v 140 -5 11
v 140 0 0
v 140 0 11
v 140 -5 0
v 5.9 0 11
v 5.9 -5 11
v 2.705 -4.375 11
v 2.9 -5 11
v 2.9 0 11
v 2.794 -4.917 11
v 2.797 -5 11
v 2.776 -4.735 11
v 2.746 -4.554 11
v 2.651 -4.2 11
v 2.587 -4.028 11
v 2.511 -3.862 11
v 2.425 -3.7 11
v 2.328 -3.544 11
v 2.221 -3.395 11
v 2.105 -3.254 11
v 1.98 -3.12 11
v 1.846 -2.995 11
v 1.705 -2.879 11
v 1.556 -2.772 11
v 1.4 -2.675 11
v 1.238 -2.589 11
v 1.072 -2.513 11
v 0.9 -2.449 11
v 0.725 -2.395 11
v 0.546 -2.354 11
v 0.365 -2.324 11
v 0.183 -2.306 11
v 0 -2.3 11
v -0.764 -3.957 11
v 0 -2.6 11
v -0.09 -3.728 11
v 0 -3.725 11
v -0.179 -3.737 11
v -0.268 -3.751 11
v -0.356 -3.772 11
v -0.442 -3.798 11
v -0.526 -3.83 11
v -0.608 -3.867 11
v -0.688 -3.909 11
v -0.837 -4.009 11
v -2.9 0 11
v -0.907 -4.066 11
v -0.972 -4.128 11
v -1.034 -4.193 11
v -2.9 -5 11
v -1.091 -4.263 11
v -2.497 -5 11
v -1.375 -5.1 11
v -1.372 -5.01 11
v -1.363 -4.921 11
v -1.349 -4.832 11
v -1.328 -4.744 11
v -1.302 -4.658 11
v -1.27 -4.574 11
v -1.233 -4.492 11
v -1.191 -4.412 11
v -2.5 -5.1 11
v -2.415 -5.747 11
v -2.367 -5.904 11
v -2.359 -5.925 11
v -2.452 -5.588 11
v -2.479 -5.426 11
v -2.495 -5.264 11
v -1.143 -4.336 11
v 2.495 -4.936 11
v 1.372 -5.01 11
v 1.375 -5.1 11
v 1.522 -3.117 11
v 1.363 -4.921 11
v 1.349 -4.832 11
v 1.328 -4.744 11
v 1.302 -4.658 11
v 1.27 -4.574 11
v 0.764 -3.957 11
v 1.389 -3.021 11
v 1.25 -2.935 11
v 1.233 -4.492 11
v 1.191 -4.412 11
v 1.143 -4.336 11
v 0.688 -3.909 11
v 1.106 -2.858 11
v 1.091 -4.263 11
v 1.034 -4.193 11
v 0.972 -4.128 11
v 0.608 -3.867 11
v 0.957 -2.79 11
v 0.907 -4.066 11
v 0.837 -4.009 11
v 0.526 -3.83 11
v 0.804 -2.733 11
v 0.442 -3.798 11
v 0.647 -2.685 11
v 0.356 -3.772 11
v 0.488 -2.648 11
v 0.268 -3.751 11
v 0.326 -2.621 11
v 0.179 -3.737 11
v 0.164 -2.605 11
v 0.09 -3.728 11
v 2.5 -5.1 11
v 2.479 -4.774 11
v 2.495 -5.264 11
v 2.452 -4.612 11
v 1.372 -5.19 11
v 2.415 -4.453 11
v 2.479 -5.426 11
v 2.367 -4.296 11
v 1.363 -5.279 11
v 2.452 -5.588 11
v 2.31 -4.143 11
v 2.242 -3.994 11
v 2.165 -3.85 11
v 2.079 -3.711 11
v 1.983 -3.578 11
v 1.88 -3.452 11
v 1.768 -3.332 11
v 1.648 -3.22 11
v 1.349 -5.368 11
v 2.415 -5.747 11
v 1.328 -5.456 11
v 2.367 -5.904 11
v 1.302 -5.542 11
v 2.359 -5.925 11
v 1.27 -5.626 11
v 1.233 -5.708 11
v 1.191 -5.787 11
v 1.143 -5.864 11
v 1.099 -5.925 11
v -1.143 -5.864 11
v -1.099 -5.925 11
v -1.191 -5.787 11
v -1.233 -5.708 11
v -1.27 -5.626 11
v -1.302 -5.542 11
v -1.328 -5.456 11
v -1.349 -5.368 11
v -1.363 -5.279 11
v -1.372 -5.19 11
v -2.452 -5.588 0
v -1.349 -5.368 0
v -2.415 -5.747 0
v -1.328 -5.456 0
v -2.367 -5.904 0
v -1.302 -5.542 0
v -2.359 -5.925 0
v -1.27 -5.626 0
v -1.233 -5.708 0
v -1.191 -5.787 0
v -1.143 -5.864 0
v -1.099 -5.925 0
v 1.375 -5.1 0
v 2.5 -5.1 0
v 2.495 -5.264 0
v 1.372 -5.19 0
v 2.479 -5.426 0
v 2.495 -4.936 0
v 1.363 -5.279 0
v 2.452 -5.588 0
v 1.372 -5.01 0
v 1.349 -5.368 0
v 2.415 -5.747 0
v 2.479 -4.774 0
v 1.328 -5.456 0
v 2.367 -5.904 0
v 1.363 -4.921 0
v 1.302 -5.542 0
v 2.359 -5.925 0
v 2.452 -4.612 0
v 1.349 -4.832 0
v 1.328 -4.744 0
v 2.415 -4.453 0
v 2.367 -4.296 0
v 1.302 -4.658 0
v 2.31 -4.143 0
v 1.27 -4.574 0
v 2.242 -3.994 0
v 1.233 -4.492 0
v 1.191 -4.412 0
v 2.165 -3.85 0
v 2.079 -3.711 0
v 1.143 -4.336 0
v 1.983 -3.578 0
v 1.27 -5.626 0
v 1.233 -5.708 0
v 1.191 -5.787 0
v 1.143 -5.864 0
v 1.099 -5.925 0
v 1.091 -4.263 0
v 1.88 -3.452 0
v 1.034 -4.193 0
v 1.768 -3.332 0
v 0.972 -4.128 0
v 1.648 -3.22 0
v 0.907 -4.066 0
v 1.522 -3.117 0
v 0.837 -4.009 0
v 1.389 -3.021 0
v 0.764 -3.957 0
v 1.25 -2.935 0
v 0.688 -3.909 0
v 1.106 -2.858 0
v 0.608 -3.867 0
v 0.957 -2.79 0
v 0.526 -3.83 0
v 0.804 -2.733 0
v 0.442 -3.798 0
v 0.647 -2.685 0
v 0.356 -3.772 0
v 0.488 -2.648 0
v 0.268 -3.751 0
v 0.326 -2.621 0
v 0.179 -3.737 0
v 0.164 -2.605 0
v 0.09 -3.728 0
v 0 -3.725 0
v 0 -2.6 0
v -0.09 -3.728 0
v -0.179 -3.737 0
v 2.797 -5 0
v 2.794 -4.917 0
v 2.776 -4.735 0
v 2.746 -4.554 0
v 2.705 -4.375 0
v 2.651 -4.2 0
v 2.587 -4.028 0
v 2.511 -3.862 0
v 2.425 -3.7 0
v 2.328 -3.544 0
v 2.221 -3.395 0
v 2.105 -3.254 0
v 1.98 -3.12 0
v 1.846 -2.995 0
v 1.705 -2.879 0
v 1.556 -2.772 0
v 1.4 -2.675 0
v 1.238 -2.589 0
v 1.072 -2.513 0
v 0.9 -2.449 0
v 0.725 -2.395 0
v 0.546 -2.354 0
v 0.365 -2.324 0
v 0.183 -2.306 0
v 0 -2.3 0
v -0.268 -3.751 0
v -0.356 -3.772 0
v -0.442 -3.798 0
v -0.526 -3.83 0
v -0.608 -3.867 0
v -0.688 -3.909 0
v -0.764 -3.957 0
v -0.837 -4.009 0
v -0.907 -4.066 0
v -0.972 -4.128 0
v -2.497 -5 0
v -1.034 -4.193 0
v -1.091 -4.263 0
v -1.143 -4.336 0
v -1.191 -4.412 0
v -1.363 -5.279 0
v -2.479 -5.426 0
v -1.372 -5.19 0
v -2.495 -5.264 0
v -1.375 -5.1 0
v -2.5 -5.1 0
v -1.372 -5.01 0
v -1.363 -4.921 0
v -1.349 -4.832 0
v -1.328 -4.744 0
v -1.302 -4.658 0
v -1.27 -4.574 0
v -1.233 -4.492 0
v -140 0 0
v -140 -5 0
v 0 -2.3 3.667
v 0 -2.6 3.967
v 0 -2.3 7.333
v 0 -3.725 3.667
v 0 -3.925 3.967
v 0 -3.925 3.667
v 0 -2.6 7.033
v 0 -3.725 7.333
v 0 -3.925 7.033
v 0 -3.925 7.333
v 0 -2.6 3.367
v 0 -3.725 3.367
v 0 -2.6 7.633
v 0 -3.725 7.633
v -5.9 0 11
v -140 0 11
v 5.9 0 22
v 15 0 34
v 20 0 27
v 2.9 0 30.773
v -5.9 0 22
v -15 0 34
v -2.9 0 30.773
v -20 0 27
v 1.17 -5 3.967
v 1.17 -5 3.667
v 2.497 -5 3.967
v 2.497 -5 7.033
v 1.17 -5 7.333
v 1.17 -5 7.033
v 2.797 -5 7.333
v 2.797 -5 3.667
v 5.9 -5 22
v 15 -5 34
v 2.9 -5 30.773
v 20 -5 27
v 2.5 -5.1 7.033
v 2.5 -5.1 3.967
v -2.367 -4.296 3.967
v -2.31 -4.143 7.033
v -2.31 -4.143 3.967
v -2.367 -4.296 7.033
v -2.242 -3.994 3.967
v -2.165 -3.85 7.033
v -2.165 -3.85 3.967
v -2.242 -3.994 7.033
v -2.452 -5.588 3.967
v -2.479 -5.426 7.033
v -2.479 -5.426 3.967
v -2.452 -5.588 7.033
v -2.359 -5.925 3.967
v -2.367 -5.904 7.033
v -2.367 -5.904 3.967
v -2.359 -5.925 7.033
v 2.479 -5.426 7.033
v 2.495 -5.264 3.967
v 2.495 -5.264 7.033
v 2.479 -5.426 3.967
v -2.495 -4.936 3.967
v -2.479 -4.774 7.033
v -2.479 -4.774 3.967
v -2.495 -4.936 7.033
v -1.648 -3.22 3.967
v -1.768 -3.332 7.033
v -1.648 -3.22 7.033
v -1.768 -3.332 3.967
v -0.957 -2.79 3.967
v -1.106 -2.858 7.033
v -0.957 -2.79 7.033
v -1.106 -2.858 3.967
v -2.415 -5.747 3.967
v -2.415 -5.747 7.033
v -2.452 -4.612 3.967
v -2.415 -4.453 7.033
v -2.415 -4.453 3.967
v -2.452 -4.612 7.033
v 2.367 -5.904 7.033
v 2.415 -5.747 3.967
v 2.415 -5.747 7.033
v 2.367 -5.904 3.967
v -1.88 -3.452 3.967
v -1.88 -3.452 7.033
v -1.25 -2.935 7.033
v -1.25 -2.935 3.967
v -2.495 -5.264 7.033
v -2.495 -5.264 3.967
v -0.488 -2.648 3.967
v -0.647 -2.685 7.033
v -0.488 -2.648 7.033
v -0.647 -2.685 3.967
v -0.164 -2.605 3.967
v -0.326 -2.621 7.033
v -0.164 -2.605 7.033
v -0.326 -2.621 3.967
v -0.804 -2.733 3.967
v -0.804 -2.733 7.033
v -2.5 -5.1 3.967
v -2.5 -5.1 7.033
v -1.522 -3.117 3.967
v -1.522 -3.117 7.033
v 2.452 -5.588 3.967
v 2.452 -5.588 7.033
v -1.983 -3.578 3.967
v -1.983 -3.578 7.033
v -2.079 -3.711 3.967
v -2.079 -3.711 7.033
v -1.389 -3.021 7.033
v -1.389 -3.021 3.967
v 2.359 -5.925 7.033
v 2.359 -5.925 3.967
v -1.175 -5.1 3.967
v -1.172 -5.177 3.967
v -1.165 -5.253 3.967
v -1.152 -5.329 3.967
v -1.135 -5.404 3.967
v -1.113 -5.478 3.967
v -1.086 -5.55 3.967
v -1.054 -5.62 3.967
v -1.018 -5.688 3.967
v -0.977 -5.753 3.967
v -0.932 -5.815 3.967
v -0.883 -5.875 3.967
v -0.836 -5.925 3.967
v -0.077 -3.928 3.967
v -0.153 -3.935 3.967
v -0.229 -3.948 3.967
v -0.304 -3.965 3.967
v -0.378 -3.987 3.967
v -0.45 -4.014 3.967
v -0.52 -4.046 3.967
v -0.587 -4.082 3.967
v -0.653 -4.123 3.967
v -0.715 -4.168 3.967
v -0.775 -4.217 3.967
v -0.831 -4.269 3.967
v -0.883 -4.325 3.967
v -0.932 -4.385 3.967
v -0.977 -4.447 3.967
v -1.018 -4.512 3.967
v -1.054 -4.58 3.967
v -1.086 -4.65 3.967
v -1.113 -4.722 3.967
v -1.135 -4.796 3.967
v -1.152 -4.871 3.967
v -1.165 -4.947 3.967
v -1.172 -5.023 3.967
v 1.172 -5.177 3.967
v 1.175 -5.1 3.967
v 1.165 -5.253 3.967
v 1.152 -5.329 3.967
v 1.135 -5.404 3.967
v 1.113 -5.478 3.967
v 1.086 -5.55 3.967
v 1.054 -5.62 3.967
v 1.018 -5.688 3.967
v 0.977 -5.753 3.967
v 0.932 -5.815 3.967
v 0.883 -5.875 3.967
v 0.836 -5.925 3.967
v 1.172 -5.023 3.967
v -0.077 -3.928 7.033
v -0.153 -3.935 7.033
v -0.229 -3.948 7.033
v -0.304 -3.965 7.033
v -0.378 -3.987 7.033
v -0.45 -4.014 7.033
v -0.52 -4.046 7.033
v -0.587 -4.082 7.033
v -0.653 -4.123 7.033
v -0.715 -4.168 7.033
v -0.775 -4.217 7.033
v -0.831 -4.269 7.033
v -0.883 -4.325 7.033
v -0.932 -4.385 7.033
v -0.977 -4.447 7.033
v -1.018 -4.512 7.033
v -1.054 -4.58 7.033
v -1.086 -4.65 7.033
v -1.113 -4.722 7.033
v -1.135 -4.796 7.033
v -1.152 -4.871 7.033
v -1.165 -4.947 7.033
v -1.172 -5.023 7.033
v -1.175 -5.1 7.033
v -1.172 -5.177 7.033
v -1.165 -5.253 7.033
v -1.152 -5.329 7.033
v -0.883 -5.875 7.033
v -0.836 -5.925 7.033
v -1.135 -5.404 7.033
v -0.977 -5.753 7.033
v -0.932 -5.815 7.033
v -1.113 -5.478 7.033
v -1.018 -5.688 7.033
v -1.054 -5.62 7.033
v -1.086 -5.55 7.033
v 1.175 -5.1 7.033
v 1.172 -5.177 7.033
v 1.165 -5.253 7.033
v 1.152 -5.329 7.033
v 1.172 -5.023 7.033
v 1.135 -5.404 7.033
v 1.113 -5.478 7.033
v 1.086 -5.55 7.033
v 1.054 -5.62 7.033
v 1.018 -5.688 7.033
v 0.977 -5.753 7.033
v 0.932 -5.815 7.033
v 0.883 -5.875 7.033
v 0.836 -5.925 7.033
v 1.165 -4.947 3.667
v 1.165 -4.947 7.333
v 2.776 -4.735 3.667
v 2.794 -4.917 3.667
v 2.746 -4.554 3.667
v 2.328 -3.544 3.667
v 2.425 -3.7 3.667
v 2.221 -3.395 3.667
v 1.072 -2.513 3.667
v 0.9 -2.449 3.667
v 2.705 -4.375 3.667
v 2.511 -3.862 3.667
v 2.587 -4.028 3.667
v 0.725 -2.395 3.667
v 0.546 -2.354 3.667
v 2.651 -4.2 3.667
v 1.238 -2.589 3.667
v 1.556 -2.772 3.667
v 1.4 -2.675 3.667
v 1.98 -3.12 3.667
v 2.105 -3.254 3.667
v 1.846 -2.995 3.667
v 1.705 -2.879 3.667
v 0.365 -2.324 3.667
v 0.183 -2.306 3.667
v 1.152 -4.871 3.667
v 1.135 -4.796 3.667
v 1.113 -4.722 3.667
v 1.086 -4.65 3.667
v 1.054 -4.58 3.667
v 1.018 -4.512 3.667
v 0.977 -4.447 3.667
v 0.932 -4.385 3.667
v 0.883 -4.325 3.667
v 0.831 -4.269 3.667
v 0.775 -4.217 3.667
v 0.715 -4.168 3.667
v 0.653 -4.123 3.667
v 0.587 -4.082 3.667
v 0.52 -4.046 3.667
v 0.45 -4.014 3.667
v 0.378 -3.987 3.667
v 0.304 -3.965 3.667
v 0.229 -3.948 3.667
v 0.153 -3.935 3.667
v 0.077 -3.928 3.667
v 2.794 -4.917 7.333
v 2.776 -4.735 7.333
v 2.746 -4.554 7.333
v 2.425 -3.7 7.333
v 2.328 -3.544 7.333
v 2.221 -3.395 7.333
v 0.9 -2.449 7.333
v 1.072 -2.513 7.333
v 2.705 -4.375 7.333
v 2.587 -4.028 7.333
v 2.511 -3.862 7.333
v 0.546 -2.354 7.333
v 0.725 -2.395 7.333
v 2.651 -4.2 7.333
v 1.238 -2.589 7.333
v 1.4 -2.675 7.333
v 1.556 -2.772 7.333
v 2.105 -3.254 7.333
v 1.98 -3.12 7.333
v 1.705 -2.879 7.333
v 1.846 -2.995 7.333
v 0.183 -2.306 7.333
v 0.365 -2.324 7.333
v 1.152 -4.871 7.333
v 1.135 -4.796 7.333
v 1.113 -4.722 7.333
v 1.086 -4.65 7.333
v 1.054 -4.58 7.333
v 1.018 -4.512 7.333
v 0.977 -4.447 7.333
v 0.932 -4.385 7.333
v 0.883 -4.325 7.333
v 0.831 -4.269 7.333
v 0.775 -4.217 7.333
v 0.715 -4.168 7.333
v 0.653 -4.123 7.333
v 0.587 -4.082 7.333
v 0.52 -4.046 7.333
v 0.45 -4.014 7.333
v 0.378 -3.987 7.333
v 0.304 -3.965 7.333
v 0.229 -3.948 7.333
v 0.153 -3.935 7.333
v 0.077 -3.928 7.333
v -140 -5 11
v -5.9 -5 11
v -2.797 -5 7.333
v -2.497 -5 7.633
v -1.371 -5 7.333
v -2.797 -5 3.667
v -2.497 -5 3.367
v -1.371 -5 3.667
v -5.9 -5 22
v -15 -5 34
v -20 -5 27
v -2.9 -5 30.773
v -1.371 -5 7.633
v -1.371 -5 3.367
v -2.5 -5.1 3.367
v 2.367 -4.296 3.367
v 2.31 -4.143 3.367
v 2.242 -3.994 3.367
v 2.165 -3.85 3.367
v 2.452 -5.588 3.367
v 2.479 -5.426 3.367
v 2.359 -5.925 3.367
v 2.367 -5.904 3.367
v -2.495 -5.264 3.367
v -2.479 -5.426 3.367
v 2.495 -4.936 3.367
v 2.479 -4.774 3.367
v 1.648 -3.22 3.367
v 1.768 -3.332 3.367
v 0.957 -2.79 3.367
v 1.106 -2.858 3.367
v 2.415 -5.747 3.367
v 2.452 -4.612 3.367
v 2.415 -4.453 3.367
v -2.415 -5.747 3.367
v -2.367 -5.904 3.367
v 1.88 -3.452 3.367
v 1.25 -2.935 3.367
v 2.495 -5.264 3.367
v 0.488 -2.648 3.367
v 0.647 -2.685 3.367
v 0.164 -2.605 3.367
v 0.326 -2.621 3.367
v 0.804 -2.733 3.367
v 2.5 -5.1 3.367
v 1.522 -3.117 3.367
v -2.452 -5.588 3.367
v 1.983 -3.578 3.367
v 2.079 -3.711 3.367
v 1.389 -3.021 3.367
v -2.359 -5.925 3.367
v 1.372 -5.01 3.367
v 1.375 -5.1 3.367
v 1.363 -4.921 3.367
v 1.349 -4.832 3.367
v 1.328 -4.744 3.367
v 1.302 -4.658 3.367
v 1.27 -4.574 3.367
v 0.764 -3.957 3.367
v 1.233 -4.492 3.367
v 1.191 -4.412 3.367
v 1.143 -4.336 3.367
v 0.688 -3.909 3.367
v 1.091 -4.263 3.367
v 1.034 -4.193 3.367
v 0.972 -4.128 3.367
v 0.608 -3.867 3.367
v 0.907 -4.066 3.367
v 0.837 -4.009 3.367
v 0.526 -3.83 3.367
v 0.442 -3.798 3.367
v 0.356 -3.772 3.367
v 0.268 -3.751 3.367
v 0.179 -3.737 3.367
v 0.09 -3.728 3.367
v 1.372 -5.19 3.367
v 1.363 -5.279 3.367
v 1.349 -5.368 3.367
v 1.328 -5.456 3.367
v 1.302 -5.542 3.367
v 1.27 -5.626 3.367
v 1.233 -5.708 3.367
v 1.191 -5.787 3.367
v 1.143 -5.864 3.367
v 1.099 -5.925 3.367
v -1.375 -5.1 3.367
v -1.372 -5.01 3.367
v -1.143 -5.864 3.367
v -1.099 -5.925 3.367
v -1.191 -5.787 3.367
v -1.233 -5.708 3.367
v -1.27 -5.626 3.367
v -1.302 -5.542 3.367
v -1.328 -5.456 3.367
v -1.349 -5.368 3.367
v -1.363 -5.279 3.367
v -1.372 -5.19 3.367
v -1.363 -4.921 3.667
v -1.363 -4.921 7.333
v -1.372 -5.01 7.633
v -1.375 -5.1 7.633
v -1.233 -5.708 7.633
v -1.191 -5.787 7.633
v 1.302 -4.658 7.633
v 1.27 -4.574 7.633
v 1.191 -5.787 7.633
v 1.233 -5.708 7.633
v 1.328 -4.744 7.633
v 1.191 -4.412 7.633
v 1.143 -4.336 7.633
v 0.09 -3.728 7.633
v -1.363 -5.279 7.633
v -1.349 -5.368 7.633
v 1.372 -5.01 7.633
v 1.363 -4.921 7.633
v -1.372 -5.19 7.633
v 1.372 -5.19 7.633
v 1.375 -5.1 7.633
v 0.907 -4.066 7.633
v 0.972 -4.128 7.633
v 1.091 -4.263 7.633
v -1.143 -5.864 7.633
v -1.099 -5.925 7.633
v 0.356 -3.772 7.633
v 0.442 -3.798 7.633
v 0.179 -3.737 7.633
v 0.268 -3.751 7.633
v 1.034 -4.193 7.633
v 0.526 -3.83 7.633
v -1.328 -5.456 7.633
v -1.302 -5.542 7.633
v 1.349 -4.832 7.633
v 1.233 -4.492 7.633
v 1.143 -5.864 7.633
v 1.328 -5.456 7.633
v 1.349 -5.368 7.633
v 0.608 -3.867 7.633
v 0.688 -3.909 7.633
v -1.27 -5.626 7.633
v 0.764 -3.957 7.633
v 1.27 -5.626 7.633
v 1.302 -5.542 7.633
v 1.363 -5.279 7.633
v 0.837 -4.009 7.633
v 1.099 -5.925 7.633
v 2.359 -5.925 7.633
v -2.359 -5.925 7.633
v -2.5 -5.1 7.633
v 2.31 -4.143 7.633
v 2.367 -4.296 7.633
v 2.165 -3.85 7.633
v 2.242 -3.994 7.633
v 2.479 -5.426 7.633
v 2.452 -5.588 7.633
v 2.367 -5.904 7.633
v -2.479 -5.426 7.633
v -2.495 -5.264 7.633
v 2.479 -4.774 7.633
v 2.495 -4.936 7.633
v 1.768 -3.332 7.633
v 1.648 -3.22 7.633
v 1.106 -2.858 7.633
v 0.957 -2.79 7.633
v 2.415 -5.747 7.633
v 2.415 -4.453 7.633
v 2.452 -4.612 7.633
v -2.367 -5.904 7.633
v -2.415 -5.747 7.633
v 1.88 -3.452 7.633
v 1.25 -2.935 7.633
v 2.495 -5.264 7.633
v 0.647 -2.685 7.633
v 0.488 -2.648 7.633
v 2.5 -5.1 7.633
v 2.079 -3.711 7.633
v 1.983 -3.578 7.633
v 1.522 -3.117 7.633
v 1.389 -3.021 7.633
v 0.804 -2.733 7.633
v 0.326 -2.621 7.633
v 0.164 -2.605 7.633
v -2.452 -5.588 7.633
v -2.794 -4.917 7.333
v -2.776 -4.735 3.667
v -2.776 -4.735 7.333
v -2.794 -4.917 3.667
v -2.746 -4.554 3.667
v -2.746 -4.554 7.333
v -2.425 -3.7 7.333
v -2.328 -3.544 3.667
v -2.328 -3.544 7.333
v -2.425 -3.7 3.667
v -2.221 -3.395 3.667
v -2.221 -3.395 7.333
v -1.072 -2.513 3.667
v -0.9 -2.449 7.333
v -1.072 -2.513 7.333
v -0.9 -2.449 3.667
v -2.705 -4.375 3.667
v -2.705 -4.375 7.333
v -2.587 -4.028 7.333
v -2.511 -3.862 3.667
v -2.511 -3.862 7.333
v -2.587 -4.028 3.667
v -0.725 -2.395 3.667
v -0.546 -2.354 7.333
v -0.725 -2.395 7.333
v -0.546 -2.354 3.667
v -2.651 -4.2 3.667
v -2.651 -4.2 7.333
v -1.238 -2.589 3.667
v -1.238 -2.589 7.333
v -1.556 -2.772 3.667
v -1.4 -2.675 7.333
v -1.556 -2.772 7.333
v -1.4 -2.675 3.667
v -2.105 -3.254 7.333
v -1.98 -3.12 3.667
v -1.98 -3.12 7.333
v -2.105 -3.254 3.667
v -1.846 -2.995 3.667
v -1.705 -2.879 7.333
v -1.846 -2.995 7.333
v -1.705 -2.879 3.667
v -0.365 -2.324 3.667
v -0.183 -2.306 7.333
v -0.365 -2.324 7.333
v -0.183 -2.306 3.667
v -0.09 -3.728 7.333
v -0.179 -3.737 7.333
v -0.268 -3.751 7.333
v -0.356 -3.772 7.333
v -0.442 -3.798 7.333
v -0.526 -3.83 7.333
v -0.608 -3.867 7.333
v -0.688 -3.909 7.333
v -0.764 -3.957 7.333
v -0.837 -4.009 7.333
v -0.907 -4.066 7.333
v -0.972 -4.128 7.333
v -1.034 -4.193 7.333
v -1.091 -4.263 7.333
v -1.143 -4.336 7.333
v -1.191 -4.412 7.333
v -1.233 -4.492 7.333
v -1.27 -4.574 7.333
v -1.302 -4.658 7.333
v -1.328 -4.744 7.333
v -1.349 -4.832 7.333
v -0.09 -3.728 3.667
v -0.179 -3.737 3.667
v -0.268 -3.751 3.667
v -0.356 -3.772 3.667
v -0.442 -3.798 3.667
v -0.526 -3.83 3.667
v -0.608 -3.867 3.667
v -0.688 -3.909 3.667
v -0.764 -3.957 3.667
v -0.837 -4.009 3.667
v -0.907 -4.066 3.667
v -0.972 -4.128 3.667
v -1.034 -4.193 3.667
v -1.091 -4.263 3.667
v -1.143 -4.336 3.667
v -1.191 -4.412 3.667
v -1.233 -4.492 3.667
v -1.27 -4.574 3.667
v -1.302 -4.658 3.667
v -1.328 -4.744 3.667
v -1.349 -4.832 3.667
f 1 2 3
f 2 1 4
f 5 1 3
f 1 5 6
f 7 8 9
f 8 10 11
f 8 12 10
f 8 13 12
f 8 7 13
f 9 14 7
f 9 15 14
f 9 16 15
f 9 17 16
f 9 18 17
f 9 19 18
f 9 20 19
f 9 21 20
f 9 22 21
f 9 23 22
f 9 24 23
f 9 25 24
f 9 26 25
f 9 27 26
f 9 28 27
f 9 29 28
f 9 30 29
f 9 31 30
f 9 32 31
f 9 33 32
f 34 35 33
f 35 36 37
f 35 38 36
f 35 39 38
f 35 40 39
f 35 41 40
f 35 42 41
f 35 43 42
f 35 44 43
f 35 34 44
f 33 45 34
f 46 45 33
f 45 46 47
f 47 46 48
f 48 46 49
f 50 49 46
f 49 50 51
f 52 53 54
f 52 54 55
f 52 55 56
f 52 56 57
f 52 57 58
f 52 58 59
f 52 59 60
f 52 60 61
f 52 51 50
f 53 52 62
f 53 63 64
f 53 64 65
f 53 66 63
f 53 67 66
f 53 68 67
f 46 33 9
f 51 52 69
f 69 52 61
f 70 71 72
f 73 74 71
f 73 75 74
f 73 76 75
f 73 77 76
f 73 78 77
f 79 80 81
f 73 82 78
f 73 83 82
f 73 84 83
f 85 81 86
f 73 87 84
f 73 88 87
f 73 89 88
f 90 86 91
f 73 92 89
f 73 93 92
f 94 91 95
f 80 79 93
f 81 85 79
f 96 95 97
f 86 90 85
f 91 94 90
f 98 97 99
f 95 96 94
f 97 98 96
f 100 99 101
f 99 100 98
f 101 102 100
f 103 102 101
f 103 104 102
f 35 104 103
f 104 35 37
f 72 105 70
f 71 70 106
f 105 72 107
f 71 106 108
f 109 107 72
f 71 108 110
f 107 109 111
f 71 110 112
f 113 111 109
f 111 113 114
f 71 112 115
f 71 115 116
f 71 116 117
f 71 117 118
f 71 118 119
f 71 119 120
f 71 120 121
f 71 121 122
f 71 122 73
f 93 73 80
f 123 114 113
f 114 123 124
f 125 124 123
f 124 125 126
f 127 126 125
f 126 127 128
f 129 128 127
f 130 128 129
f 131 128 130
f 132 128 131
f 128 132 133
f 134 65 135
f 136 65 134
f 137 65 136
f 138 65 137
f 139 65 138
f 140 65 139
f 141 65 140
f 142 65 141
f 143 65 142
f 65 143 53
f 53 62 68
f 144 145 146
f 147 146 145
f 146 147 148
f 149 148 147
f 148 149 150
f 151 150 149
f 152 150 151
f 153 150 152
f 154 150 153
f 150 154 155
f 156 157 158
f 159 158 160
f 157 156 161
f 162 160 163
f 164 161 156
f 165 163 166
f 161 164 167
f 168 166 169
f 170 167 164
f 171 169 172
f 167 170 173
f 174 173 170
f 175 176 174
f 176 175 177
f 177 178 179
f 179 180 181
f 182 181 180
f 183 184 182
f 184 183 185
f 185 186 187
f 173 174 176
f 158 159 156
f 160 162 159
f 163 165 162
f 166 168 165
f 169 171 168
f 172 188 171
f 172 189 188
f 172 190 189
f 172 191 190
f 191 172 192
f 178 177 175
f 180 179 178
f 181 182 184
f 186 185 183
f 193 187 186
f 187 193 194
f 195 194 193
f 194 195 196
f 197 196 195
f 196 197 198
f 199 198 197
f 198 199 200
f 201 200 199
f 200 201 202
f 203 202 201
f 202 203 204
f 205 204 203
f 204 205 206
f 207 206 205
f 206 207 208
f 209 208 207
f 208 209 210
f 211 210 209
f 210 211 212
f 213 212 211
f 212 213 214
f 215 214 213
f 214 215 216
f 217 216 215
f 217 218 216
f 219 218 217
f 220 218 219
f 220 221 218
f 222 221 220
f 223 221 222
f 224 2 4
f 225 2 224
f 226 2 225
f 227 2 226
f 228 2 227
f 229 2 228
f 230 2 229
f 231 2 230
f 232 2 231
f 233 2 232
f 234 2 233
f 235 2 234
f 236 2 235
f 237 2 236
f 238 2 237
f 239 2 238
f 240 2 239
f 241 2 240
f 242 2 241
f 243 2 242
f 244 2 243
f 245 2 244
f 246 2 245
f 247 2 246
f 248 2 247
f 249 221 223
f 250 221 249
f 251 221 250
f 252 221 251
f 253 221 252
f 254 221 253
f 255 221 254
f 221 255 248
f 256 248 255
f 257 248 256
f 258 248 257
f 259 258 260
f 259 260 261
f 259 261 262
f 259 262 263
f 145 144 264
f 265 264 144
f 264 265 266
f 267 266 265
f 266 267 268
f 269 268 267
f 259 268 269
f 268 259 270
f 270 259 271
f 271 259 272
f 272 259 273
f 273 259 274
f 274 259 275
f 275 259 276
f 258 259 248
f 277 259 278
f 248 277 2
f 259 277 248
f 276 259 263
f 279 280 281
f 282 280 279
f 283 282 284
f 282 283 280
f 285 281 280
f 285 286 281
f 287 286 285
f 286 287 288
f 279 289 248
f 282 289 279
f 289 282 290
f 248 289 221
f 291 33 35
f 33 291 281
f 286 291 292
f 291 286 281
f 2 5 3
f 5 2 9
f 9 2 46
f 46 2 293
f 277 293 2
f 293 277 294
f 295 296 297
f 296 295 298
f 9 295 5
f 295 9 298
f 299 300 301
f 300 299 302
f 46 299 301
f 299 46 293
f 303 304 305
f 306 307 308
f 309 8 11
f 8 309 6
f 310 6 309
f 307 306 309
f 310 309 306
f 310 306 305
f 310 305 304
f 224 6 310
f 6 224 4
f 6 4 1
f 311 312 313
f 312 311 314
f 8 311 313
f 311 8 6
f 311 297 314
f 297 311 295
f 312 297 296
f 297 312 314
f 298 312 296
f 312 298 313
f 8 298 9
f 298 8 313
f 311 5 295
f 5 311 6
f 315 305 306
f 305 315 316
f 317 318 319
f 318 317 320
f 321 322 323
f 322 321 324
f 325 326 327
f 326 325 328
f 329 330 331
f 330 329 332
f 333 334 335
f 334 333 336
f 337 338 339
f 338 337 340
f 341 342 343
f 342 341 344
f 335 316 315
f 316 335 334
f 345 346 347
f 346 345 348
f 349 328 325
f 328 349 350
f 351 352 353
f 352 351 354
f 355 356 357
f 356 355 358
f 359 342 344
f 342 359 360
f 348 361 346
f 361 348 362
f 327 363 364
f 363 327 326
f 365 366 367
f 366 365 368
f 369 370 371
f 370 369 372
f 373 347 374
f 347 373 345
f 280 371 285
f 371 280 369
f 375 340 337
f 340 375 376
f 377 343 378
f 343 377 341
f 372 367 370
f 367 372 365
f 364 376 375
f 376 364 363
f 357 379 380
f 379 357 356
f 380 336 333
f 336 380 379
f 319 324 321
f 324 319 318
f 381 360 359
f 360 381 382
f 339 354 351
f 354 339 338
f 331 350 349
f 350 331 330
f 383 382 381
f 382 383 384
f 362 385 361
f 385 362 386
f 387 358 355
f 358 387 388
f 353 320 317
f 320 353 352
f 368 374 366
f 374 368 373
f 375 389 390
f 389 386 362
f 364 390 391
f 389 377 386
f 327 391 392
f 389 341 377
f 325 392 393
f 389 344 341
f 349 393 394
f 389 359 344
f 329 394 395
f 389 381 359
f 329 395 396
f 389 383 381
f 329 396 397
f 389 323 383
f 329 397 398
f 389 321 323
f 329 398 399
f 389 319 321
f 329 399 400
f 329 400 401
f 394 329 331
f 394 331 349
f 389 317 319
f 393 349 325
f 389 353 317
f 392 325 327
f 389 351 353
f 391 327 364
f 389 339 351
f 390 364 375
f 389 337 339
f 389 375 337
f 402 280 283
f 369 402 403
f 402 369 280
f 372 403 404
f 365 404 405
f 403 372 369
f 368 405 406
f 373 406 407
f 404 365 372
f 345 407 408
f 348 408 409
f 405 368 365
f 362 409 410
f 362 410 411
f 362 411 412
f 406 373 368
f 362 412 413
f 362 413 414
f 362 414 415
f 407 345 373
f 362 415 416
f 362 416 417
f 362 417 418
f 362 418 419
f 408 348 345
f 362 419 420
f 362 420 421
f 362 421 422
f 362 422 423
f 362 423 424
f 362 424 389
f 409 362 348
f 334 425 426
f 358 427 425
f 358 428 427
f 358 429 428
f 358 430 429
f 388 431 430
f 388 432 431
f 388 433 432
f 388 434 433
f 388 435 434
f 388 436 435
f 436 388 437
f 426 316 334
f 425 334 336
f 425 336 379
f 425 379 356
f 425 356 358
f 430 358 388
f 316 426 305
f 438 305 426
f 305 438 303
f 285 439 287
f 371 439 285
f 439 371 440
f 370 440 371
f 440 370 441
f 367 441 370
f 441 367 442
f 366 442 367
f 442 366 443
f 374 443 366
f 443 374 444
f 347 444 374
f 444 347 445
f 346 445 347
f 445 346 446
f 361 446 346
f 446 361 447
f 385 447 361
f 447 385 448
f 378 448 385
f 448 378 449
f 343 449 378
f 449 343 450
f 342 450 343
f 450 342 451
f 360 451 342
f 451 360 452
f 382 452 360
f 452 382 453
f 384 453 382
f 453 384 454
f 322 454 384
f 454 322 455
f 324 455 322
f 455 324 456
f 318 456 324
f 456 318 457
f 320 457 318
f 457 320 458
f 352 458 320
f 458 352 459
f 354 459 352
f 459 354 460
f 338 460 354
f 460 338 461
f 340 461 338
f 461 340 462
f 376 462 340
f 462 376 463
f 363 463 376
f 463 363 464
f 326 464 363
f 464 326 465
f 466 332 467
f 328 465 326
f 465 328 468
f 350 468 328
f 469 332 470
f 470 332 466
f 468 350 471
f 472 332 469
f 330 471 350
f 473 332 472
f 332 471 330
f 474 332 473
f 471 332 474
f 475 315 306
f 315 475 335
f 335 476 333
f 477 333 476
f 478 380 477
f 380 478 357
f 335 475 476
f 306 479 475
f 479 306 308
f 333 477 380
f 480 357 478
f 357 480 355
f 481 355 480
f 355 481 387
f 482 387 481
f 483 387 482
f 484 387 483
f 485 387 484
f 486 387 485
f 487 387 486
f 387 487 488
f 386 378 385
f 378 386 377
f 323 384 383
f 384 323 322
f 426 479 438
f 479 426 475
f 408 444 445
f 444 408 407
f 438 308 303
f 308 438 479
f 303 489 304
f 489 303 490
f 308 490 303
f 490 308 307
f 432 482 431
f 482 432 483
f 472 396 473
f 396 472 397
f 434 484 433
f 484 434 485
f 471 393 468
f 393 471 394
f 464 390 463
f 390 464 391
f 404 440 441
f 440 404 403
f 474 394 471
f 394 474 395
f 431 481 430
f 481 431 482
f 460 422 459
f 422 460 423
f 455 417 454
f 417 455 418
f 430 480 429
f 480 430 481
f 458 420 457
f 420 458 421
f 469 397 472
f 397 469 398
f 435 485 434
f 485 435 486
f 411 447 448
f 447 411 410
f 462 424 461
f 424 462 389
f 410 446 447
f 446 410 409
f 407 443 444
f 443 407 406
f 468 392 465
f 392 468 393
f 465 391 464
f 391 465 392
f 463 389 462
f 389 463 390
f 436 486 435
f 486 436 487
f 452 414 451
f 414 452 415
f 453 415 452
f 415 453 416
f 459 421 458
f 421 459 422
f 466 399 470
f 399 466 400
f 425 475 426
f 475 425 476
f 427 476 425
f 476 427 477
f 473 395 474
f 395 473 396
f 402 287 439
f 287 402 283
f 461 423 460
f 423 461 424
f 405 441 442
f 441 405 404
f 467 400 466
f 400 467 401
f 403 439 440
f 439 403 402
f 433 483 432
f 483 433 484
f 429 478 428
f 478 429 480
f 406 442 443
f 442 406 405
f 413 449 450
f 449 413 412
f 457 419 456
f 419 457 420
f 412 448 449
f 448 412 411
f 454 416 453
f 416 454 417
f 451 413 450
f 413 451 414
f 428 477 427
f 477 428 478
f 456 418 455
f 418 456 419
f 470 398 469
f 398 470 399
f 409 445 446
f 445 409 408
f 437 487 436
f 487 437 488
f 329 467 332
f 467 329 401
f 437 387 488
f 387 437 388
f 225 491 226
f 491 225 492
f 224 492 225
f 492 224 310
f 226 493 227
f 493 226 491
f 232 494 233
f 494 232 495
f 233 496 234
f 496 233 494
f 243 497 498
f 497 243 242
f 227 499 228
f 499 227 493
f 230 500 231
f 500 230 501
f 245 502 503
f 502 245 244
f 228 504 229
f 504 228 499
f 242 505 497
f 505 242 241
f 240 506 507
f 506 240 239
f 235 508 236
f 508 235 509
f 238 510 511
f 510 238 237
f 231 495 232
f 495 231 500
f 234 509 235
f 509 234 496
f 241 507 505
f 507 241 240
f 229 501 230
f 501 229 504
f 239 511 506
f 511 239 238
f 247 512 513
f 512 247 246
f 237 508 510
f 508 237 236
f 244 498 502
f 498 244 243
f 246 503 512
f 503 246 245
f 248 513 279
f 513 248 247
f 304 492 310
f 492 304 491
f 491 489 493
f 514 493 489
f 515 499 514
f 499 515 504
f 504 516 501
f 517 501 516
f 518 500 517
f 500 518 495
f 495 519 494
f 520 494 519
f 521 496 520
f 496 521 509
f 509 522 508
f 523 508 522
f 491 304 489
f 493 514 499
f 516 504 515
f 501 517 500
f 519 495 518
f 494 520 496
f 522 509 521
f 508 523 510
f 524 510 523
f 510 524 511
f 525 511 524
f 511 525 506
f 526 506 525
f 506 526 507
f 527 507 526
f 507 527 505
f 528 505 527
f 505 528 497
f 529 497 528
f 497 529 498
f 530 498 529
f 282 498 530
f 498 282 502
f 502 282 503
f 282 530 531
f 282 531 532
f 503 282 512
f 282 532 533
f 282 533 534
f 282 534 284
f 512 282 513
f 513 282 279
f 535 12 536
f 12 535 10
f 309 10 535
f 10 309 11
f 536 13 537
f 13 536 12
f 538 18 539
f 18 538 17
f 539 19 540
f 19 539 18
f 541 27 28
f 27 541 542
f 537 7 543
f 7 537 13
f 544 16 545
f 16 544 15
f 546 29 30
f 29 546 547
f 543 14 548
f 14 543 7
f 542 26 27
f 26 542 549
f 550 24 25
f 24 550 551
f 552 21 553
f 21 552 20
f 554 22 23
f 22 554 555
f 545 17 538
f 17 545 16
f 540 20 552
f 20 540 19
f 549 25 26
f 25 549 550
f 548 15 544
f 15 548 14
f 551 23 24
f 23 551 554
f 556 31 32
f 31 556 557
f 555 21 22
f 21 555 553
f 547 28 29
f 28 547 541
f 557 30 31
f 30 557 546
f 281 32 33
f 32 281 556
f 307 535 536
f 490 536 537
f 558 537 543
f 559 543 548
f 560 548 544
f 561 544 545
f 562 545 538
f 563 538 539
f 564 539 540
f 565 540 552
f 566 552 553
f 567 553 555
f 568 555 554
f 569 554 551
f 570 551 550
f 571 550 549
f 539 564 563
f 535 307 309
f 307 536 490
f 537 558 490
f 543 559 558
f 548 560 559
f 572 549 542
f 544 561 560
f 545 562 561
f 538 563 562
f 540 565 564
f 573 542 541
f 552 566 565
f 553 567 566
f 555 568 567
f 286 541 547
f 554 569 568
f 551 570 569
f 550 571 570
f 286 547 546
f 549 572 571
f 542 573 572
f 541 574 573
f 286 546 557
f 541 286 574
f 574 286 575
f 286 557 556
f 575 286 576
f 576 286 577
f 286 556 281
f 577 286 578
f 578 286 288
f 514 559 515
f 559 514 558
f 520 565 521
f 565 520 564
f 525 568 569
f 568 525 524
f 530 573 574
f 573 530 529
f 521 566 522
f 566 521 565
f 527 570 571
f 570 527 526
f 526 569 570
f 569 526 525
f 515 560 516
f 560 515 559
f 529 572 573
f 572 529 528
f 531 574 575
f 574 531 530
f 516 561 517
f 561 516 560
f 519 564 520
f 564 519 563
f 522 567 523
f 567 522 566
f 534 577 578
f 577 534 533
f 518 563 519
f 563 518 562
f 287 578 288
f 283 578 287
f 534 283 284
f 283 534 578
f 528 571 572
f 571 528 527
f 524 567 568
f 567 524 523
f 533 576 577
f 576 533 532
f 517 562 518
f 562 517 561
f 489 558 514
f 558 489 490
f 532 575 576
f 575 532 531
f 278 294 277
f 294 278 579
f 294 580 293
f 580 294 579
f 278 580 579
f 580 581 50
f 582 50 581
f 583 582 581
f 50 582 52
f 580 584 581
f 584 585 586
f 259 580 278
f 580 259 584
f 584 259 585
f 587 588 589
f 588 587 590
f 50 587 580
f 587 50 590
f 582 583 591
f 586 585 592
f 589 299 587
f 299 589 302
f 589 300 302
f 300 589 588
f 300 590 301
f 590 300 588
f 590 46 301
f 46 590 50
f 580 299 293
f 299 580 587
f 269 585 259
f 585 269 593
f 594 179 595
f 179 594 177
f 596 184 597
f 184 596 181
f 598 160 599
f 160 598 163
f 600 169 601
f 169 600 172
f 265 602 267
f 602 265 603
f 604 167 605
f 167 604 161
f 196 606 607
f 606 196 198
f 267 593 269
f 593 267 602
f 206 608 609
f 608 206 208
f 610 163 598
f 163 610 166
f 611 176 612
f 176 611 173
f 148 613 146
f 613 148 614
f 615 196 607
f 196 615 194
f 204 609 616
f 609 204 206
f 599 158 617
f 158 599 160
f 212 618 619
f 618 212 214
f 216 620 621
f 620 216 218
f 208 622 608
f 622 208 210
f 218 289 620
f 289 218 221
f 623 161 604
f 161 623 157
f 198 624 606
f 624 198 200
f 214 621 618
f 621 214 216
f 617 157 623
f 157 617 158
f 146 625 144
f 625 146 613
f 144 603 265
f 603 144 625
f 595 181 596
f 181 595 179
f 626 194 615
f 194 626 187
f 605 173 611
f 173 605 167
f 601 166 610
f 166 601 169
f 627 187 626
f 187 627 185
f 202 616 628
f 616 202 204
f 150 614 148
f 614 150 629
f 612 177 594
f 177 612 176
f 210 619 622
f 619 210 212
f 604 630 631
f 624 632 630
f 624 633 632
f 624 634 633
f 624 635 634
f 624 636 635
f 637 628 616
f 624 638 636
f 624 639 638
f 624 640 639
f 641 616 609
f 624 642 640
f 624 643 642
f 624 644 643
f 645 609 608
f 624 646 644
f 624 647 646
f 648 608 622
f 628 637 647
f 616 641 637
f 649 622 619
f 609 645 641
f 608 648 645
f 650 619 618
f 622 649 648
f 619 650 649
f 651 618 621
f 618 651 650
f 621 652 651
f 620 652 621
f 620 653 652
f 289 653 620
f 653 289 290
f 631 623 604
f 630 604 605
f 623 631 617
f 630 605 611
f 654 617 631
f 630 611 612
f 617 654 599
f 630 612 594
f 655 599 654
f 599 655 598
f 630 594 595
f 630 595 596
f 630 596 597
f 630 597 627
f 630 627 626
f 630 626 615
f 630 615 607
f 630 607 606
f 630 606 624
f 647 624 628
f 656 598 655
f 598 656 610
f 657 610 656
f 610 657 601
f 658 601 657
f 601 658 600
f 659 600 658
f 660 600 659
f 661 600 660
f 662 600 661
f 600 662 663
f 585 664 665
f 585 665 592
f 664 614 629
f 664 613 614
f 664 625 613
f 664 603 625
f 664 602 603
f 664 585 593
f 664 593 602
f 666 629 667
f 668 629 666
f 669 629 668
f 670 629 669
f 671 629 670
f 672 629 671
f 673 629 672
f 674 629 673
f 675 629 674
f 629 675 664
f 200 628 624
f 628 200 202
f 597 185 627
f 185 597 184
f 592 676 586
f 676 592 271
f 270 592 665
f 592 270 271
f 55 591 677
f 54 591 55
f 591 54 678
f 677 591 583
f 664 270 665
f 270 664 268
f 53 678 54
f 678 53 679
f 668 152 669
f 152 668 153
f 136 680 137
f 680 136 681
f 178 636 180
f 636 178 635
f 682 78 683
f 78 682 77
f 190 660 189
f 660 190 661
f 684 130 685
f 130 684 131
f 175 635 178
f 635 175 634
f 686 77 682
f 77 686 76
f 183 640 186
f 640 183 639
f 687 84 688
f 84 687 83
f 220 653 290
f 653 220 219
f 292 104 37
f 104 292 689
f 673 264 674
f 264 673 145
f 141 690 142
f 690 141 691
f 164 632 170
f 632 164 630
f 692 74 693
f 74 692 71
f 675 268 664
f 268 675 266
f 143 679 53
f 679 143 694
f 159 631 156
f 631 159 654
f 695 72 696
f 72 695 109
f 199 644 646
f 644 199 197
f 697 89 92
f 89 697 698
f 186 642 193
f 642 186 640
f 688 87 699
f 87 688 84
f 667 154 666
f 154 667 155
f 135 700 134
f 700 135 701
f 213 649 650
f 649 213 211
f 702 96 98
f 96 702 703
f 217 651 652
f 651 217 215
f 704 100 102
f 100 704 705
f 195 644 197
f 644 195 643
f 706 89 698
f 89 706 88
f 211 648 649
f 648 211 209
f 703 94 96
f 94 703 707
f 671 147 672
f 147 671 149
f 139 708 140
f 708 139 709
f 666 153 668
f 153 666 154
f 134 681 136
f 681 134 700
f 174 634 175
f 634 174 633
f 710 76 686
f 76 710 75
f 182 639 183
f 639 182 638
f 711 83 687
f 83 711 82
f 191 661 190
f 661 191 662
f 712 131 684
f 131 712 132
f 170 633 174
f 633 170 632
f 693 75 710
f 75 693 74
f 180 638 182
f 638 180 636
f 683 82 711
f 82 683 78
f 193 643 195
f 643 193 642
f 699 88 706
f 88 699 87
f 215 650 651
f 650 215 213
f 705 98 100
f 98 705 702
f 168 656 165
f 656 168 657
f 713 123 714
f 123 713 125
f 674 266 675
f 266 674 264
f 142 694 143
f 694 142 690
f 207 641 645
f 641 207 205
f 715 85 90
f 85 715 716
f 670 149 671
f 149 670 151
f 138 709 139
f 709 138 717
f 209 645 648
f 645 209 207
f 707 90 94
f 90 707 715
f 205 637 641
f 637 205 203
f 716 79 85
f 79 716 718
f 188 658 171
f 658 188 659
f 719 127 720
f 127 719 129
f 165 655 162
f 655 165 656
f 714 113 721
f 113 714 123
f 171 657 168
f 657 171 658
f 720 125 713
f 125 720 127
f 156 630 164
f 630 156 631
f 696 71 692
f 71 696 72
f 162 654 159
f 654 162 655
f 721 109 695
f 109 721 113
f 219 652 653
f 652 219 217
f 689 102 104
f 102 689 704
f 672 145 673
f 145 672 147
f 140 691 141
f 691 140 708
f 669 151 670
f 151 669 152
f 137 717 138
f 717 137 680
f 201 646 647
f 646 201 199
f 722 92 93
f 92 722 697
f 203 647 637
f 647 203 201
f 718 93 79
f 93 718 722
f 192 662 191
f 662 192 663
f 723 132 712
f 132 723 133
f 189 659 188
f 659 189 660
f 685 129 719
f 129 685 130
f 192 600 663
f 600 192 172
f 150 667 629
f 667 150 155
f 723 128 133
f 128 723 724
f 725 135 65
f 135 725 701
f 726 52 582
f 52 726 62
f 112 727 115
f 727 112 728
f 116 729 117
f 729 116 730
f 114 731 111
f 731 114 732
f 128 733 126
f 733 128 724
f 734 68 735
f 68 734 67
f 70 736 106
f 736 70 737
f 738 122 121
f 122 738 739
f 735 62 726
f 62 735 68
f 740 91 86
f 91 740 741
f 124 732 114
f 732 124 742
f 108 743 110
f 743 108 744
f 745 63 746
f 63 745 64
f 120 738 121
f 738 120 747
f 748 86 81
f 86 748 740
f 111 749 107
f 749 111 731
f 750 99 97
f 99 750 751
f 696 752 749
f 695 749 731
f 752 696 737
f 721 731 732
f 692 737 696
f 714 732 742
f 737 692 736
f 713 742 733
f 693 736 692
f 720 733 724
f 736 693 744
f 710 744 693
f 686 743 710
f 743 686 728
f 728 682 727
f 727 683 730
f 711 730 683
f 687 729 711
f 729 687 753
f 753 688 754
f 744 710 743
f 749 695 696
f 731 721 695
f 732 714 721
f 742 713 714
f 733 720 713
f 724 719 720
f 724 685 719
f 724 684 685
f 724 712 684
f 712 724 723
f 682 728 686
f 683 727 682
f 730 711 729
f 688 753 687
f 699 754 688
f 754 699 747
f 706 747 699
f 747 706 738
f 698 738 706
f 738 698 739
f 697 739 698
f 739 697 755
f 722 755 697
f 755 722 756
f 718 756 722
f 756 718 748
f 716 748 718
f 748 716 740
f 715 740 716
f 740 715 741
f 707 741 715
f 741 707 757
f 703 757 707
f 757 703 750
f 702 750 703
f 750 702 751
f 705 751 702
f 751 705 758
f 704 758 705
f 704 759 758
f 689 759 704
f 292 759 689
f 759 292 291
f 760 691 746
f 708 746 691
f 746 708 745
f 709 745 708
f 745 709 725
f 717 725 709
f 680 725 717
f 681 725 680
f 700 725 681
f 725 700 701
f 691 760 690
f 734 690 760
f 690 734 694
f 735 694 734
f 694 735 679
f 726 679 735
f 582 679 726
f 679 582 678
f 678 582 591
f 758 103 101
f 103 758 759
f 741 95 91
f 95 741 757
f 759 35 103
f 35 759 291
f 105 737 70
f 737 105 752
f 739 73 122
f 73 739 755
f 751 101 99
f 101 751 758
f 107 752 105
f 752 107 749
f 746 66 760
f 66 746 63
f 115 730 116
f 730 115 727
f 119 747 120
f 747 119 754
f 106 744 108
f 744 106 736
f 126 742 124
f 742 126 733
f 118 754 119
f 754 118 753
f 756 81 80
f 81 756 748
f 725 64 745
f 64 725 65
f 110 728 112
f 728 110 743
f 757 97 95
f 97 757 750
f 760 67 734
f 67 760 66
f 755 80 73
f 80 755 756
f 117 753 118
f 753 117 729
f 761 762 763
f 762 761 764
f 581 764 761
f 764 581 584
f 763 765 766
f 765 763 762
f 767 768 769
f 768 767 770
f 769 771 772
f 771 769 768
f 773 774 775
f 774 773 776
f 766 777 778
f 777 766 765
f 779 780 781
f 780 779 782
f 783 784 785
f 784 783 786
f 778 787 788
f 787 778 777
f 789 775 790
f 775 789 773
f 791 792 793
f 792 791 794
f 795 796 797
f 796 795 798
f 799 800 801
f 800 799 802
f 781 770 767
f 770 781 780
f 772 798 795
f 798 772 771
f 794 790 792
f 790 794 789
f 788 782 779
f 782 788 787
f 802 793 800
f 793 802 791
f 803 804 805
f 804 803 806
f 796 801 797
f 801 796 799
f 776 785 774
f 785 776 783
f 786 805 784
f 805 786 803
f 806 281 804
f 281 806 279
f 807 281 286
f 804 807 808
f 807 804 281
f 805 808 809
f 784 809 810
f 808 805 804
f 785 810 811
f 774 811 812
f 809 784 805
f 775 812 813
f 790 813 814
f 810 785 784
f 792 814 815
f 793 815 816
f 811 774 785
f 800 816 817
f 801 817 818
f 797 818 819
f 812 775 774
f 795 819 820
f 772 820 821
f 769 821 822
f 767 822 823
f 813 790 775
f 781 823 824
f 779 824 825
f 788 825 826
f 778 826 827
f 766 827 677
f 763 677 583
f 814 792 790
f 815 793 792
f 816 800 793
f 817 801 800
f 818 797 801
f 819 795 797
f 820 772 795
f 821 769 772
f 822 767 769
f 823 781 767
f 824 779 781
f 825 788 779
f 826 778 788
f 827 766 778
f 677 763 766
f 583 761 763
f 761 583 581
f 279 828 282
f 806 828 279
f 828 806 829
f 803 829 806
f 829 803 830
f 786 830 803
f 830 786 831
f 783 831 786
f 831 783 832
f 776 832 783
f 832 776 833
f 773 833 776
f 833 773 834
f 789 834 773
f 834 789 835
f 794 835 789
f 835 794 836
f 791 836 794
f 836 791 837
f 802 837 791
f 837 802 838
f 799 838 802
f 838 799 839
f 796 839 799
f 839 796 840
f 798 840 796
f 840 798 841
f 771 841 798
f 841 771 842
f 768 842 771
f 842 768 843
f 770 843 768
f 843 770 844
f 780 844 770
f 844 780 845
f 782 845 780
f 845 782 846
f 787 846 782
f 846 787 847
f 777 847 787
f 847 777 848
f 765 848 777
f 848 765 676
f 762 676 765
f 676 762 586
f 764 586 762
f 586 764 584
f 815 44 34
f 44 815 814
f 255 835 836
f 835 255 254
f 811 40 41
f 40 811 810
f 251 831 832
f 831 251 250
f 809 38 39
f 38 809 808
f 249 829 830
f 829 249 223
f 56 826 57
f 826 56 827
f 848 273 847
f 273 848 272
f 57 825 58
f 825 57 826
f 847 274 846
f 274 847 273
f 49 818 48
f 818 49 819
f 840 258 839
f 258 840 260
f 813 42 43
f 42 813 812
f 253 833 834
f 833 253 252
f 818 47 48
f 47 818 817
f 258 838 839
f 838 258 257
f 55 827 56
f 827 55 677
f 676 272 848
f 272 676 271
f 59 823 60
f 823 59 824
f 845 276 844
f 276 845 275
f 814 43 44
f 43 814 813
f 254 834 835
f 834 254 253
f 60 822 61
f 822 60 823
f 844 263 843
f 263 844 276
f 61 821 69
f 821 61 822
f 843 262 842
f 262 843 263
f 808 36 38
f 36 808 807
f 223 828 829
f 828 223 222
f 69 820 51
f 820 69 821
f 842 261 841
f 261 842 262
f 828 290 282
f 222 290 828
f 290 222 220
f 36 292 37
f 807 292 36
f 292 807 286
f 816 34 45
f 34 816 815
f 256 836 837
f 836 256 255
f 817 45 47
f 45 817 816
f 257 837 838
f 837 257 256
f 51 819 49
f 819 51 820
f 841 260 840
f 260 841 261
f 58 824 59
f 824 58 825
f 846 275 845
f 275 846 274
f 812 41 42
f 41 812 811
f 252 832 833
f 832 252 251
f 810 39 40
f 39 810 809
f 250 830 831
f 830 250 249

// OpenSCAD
// =====================================================================
//  STRUCTURE DE CABAS VELO -- type BikeZac / Cobags            [v14]
//
//  LE CROCHET SE POSE, IL NE SE CLIPSE PAS.
//    Le tube du porte-bagages est ferme, soude au cadre : on ne l'enfile
//    pas dans une bouche etroite, on POSE le crochet dessus. Le v12
//    enroulait 230 deg avec une bouche de 8 mm -- impossible a engager.
//    Ce n'etait pas une cote fausse, c'etait la cinematique de montage.
//
//  FORME EN R (v14, d'apres le croquis cote).
//    Un dos plat (le collier qui enfile le jonc), un BRAS DU HAUT
//    horizontal, un VENTRE en arc qui epouse le tube, puis une LANGUETTE
//    droite qui descend : le pied du R, levier de decrochage. Le tube se
//    loge dans le ventre.
//    Le centre de l'arc EST le centre du tube : si le rayon interieur
//    vaut tube_d/2 + clr, l'arc epouse le flanc et le bras du haut touche
//    le sommet. Une seule cote (tube_d) gouverne les deux.
//
//  CE QUI TIENT LE SAC : le poids, qui plaque le bras du haut sur le tube,
//    et l'elastique en bas. Pas une barbe serree. La languette ne
//    "declipse" rien, elle fait pivoter le crochet a la main.
//
//  IMPRESSION : profil plan, extrude 15,05 mm en Z. Aucun porte-a-faux.
//    Dans un ruban qui flechit, la contrainte court LE LONG du ruban,
//    donc dans le plan des couches.
//
//  NB. Les cotes du croquis (dos 25, bras 15/10, ventre 21x17, languette
//  10) sont dans docs/target_hook.json. On ne les recopie pas ici : le
//  modele sort ses cotes REELLES par echo, l'outillage superpose la cible.
// =====================================================================

$fn = 96;
part = "all";   // "a"|"b"|"hook"|"hooks3"|"gauge"|"plate"|"hinge_test"|"all"

// --- JONC -------------------------------------------------------------
total_len   = 280;
bar_h       = 11;
bar_t       = 5;
hook_start  = 37.5;
tail_span   = 40;
tail_stem   = 14;

// --- COTES RELEVEES SUR LE CROCHET ORIGINAL ---------------------------
hook_len    = 15.05;  // largeur : axe d'extrusion
hook_depth  = 21.55;  // face du collier -> point le plus eloigne (croquis : 21)

// --- MESURE -----------------------------------------------------------
tube_d      = 12.23;  // tube du porte-bagages, au pied a coulisse
rib_t       = 2.5;    // epaisseur du ruban   (A CONFIRMER)
clr         = 0.4;    // jeu ruban / tube

// --- FORME DU R, ESTIME SUR PHOTO/CROQUIS, A CORRIGER -----------------
wrap_end    = -50;    //   0  = quart de cercle nu, rien ne retient
                      // -50  = le ruban passe sous le tube : levre legere
                      // plus negatif = levre plus fermee, pose plus dure
lang_l      = 10;     // longueur de la languette (le pied du R). Croquis : 10
lang_ang    = -90;    // cap absolu de la languette : -90 = tout droit vers le
                      // bas. Plus positif = languette rejetee vers le tube
                      // (referme la bouche) ; plus negatif = vers le dos.
bevel_a     = 35;     // biseau du bout de languette

// --- COLLIER ----------------------------------------------------------
col_wall    = 1.8;
col_clr     = 0.15;

// --- CHARNIERE --------------------------------------------------------
pin_d       = 2.5;    // 2.5 corde a piano | 4.0 vis sans tete M4
pin_gap     = 0.1;
kn_wall     = 1.25;
capture_t   = 0.3;
kn_clr      = 0.3;
hinge_clr   = 0.3;
tight_int   = 0.15;
free_clr    = 0.25;

// =====================  GEOMETRIE DERIVEE  ============================
half_len   = total_len / 2;
pin_y      = -(bar_t + pin_gap);
knuckle    = pin_d/2 + kn_wall;
bore_tight = pin_d - tight_int;
bore_free  = pin_d + free_clr;
rc         = knuckle + hinge_clr;
butee      = abs(pin_y) - rc;
tail_root  = rc + 0.1;
hinge_lip  = sqrt(pow(bore_free/2,2) - pow((pin_d - capture_t)/2,2));
debord     = pin_gap + hinge_lip;
axe_out    = pin_gap + pin_d/2;
capture    = pin_d - 2*sqrt(pow(bore_free/2,2) - pow(hinge_lip,2));
k1 = bar_h/3;
k2 = 2*bar_h/3;

ci_u0 = -bar_t - col_clr;  ci_u1 =  col_clr;
ci_v0 = -col_clr;          ci_v1 =  bar_h + col_clr;
co_u0 = ci_u0 - col_wall;  co_u1 = ci_u1 + col_wall;
co_v0 = ci_v0 - col_wall;  co_v1 = ci_v1 + col_wall;

Rc    = tube_d/2 + clr + rib_t/2;            // ligne moyenne de l'arc du ventre
cu    = co_u1 + hook_depth - rib_t/2 - Rc;   // centre du tube, profondeur
v_top = co_v1 - rib_t/2;                     // bras du haut, arase au collier
cv    = v_top - Rc;                          // centre du tube, hauteur

// -- languette droite : levier a cap fixe (v14), plus force tangente a l'arc
lipe   = [cu + Rc*cos(wrap_end), cv + Rc*sin(wrap_end)];   // sortie de l'arc
u_tip  = lipe[0] + lang_l*cos(lang_ang);
v_tip  = lipe[1] + lang_l*sin(lang_ang);
mouth  = (u_tip - rib_t/2) - co_u1;          // passage horizontal libre pour poser

// -- cotes REELLES, a comparer a docs/target_hook.json (cible-vs-reel)
depth_r  = cu + Rc + rib_t/2 - co_u1;                    // ventre : profondeur
height_r = (v_top + rib_t/2) - (v_tip - rib_t/2);        // dos : hauteur totale
armtop_r = cu - co_u1;                                   // bras du haut
arc_low  = min(cv - Rc, cv + Rc*sin(wrap_end));          // bas de l'arc trace
bowl_r   = (cv + Rc) - arc_low + rib_t;                  // ventre : hauteur
lipsous  = cv - lipe[1];                                 // levre sous le tube

echo(str("Tube Phi", tube_d, " centre [", cu, ", ", cv, "]  R_moy ", Rc));
echo(str("Profondeur = ", depth_r, "  (cible ", hook_depth, ")"));
echo(str("Hauteur totale = ", height_r, "  (dos ; croquis 25)"));
echo(str("Ventre = ", bowl_r, "  (croquis 17)"));
echo(str("Bras du haut = ", armtop_r, "  (croquis 15)"));
echo(str("Languette = ", lang_l, " mm a ", lang_ang, " deg  (croquis 10)"));
echo(str("Enroulement = ", 90 - wrap_end, " deg ; levre sous le tube = ", lipsous, " mm"));
echo(str("Bouche de pose = ", mouth, " mm   (tube ", tube_d, ")"));
echo(str("Jeu tube / jonc = ", (cu - tube_d/2) - co_u1, " mm"));
echo(str("Entraxe = ", total_len - 2*(hook_start + hook_len/2), " mm"));
echo(str("Butee charniere = ", butee, " ; debord axe = ", axe_out, " ; capture = ", capture));

// -- gardes : COHERENCE INTERNE uniquement, jamais une mesure supposee.
assert(cu - tube_d/2 > co_u1,    "Le tube traverse le jonc.");
assert(wrap_end <= 0,            "L'enroulement doit atteindre le quart de cercle.");
assert(wrap_end > -80,           "Trop enroule : le crochet ne se posera plus.");
assert(mouth > tube_d * 0.75,    "Bouche trop etroite : impossible de poser le crochet.");
assert(v_tip < cv - tube_d/2,    "La languette ne descend pas sous le tube.");
assert(lang_l > 0,               "Languette de longueur nulle.");
assert(rib_t >= 2.0,             "Ruban trop mince.");
assert(butee >= 1.5,             "Butee trop mince.");
assert(hinge_lip < bore_tight/2, "Levre de charniere trop profonde.");
assert(capture >= 0.2,           "Levre de charniere trop courte.");
assert(kn_wall >= 1.2,           "Paroi de charnon trop mince.");
assert(tail_root >= rc,          "La racine du lobe empiete sur le degagement.");

// ======================  CROCHET  =====================================
function pol(c, r, a) = [c[0] + r*cos(a), c[1] + r*sin(a)];

module chain(pts, t) {
    for (i = [0 : len(pts)-2])
        hull() {
            translate(pts[i])   circle(d = t, $fn = 24);
            translate(pts[i+1]) circle(d = t, $fn = 24);
        }
}

arc  = [ for (a = [90 : -5 : wrap_end]) pol([cu, cv], Rc, a) ];
path = concat([[0, v_top]], arc, [[u_tip, v_tip]]);

module hook2d() {
    difference() {
        union() {
            translate([co_u0, co_v0]) square([co_u1-co_u0, co_v1-co_v0]);
            chain(path, rib_t);
        }
        translate([ci_u0, ci_v0]) square([ci_u1-ci_u0, ci_v1-ci_v0]);
        translate([u_tip, v_tip]) rotate(lang_ang + bevel_a)
            translate([0, -20]) square([40, 40]);
    }
}
module hook()   { linear_extrude(height = hook_len) hook2d(); }
module hooks3() { hook(); translate([36,0,0]) hook(); translate([72,0,0]) hook(); }
module gauge()  { cube([25, bar_h, bar_t]); }

// ======================  JONC  ========================================
module half_tail2d() {
    sh = tail_stem;
    st = tail_root + 3.0;
    intersection() {
        polygon([[-st,0],[-st,sh-3],[-tail_span/2,sh+2],[-tail_span/2+5,sh+9],
                 [0,sh+5],[tail_span/2-5,sh+9],[tail_span/2,sh+2],[st,sh-3],[st,0]]);
        translate([tail_root,-1]) square([tail_span, sh+12]);
    }
}
module knuckle_at(z0,z1,bore) {
    difference() {
        translate([0,pin_y,z0]) cylinder(r=knuckle, h=z1-z0);
        translate([0,pin_y,z0-1]) cylinder(d=bore, h=z1-z0+2);
        translate([-20,-60+pin_y-hinge_lip,z0-1]) cube([40,60,z1-z0+2]);
    }
}
module relief_at(z0,z1) {
    intersection() {
        translate([0,pin_y,z0]) cylinder(r=rc, h=z1-z0);
        translate([-20,pin_y-hinge_lip,z0]) cube([40,60,z1-z0]);
    }
}
module collar_bore(bore) {
    translate([0,pin_y,-1]) cylinder(d=bore, h=bar_h+2);
    translate([-20,-60+pin_y-hinge_lip,-1]) cube([40,60,bar_h+2]);
}
module bar_body() {
    union() {
        translate([0,-bar_t,0]) cube([half_len, bar_t, bar_h]);
        translate([0,0,bar_h]) rotate([90,0,0]) linear_extrude(height=bar_t) half_tail2d();
    }
}
module bar_a() {
    difference() {
        union() { bar_body(); knuckle_at(0,k1-kn_clr,bore_free); knuckle_at(k2+kn_clr,bar_h,bore_free); }
        relief_at(k1,k2); collar_bore(bore_free);
    }
}
module bar_b() {
    difference() {
        union() { bar_body(); knuckle_at(k1+kn_clr,k2-kn_clr,bore_tight); }
        relief_at(-1,k1); relief_at(k2,bar_h+1); collar_bore(bore_tight);
    }
}
module hinge_test() {
    intersection() {
        union() { bar_b(); translate([-0.2,0,0]) mirror([1,0,0]) bar_a(); }
        translate([-15,-30,-5]) cube([30,45,bar_h+35]);
    }
}
module bar_flat() { rotate([-90,0,0]) children(); }
module build_plate() {
    bar_flat() bar_a();
    translate([0,40,0]) bar_flat() bar_b();
    translate([0,90,0]) hooks3();
}

if      (part=="a")          bar_flat() bar_a();
else if (part=="b")          bar_flat() bar_b();
else if (part=="hook")       hook();
else if (part=="hooks3")     hooks3();
else if (part=="gauge")      gauge();
else if (part=="plate")      build_plate();
else if (part=="hinge_test") bar_flat() hinge_test();
else { bar_b(); color("DimGray") mirror([1,0,0]) bar_a(); }
